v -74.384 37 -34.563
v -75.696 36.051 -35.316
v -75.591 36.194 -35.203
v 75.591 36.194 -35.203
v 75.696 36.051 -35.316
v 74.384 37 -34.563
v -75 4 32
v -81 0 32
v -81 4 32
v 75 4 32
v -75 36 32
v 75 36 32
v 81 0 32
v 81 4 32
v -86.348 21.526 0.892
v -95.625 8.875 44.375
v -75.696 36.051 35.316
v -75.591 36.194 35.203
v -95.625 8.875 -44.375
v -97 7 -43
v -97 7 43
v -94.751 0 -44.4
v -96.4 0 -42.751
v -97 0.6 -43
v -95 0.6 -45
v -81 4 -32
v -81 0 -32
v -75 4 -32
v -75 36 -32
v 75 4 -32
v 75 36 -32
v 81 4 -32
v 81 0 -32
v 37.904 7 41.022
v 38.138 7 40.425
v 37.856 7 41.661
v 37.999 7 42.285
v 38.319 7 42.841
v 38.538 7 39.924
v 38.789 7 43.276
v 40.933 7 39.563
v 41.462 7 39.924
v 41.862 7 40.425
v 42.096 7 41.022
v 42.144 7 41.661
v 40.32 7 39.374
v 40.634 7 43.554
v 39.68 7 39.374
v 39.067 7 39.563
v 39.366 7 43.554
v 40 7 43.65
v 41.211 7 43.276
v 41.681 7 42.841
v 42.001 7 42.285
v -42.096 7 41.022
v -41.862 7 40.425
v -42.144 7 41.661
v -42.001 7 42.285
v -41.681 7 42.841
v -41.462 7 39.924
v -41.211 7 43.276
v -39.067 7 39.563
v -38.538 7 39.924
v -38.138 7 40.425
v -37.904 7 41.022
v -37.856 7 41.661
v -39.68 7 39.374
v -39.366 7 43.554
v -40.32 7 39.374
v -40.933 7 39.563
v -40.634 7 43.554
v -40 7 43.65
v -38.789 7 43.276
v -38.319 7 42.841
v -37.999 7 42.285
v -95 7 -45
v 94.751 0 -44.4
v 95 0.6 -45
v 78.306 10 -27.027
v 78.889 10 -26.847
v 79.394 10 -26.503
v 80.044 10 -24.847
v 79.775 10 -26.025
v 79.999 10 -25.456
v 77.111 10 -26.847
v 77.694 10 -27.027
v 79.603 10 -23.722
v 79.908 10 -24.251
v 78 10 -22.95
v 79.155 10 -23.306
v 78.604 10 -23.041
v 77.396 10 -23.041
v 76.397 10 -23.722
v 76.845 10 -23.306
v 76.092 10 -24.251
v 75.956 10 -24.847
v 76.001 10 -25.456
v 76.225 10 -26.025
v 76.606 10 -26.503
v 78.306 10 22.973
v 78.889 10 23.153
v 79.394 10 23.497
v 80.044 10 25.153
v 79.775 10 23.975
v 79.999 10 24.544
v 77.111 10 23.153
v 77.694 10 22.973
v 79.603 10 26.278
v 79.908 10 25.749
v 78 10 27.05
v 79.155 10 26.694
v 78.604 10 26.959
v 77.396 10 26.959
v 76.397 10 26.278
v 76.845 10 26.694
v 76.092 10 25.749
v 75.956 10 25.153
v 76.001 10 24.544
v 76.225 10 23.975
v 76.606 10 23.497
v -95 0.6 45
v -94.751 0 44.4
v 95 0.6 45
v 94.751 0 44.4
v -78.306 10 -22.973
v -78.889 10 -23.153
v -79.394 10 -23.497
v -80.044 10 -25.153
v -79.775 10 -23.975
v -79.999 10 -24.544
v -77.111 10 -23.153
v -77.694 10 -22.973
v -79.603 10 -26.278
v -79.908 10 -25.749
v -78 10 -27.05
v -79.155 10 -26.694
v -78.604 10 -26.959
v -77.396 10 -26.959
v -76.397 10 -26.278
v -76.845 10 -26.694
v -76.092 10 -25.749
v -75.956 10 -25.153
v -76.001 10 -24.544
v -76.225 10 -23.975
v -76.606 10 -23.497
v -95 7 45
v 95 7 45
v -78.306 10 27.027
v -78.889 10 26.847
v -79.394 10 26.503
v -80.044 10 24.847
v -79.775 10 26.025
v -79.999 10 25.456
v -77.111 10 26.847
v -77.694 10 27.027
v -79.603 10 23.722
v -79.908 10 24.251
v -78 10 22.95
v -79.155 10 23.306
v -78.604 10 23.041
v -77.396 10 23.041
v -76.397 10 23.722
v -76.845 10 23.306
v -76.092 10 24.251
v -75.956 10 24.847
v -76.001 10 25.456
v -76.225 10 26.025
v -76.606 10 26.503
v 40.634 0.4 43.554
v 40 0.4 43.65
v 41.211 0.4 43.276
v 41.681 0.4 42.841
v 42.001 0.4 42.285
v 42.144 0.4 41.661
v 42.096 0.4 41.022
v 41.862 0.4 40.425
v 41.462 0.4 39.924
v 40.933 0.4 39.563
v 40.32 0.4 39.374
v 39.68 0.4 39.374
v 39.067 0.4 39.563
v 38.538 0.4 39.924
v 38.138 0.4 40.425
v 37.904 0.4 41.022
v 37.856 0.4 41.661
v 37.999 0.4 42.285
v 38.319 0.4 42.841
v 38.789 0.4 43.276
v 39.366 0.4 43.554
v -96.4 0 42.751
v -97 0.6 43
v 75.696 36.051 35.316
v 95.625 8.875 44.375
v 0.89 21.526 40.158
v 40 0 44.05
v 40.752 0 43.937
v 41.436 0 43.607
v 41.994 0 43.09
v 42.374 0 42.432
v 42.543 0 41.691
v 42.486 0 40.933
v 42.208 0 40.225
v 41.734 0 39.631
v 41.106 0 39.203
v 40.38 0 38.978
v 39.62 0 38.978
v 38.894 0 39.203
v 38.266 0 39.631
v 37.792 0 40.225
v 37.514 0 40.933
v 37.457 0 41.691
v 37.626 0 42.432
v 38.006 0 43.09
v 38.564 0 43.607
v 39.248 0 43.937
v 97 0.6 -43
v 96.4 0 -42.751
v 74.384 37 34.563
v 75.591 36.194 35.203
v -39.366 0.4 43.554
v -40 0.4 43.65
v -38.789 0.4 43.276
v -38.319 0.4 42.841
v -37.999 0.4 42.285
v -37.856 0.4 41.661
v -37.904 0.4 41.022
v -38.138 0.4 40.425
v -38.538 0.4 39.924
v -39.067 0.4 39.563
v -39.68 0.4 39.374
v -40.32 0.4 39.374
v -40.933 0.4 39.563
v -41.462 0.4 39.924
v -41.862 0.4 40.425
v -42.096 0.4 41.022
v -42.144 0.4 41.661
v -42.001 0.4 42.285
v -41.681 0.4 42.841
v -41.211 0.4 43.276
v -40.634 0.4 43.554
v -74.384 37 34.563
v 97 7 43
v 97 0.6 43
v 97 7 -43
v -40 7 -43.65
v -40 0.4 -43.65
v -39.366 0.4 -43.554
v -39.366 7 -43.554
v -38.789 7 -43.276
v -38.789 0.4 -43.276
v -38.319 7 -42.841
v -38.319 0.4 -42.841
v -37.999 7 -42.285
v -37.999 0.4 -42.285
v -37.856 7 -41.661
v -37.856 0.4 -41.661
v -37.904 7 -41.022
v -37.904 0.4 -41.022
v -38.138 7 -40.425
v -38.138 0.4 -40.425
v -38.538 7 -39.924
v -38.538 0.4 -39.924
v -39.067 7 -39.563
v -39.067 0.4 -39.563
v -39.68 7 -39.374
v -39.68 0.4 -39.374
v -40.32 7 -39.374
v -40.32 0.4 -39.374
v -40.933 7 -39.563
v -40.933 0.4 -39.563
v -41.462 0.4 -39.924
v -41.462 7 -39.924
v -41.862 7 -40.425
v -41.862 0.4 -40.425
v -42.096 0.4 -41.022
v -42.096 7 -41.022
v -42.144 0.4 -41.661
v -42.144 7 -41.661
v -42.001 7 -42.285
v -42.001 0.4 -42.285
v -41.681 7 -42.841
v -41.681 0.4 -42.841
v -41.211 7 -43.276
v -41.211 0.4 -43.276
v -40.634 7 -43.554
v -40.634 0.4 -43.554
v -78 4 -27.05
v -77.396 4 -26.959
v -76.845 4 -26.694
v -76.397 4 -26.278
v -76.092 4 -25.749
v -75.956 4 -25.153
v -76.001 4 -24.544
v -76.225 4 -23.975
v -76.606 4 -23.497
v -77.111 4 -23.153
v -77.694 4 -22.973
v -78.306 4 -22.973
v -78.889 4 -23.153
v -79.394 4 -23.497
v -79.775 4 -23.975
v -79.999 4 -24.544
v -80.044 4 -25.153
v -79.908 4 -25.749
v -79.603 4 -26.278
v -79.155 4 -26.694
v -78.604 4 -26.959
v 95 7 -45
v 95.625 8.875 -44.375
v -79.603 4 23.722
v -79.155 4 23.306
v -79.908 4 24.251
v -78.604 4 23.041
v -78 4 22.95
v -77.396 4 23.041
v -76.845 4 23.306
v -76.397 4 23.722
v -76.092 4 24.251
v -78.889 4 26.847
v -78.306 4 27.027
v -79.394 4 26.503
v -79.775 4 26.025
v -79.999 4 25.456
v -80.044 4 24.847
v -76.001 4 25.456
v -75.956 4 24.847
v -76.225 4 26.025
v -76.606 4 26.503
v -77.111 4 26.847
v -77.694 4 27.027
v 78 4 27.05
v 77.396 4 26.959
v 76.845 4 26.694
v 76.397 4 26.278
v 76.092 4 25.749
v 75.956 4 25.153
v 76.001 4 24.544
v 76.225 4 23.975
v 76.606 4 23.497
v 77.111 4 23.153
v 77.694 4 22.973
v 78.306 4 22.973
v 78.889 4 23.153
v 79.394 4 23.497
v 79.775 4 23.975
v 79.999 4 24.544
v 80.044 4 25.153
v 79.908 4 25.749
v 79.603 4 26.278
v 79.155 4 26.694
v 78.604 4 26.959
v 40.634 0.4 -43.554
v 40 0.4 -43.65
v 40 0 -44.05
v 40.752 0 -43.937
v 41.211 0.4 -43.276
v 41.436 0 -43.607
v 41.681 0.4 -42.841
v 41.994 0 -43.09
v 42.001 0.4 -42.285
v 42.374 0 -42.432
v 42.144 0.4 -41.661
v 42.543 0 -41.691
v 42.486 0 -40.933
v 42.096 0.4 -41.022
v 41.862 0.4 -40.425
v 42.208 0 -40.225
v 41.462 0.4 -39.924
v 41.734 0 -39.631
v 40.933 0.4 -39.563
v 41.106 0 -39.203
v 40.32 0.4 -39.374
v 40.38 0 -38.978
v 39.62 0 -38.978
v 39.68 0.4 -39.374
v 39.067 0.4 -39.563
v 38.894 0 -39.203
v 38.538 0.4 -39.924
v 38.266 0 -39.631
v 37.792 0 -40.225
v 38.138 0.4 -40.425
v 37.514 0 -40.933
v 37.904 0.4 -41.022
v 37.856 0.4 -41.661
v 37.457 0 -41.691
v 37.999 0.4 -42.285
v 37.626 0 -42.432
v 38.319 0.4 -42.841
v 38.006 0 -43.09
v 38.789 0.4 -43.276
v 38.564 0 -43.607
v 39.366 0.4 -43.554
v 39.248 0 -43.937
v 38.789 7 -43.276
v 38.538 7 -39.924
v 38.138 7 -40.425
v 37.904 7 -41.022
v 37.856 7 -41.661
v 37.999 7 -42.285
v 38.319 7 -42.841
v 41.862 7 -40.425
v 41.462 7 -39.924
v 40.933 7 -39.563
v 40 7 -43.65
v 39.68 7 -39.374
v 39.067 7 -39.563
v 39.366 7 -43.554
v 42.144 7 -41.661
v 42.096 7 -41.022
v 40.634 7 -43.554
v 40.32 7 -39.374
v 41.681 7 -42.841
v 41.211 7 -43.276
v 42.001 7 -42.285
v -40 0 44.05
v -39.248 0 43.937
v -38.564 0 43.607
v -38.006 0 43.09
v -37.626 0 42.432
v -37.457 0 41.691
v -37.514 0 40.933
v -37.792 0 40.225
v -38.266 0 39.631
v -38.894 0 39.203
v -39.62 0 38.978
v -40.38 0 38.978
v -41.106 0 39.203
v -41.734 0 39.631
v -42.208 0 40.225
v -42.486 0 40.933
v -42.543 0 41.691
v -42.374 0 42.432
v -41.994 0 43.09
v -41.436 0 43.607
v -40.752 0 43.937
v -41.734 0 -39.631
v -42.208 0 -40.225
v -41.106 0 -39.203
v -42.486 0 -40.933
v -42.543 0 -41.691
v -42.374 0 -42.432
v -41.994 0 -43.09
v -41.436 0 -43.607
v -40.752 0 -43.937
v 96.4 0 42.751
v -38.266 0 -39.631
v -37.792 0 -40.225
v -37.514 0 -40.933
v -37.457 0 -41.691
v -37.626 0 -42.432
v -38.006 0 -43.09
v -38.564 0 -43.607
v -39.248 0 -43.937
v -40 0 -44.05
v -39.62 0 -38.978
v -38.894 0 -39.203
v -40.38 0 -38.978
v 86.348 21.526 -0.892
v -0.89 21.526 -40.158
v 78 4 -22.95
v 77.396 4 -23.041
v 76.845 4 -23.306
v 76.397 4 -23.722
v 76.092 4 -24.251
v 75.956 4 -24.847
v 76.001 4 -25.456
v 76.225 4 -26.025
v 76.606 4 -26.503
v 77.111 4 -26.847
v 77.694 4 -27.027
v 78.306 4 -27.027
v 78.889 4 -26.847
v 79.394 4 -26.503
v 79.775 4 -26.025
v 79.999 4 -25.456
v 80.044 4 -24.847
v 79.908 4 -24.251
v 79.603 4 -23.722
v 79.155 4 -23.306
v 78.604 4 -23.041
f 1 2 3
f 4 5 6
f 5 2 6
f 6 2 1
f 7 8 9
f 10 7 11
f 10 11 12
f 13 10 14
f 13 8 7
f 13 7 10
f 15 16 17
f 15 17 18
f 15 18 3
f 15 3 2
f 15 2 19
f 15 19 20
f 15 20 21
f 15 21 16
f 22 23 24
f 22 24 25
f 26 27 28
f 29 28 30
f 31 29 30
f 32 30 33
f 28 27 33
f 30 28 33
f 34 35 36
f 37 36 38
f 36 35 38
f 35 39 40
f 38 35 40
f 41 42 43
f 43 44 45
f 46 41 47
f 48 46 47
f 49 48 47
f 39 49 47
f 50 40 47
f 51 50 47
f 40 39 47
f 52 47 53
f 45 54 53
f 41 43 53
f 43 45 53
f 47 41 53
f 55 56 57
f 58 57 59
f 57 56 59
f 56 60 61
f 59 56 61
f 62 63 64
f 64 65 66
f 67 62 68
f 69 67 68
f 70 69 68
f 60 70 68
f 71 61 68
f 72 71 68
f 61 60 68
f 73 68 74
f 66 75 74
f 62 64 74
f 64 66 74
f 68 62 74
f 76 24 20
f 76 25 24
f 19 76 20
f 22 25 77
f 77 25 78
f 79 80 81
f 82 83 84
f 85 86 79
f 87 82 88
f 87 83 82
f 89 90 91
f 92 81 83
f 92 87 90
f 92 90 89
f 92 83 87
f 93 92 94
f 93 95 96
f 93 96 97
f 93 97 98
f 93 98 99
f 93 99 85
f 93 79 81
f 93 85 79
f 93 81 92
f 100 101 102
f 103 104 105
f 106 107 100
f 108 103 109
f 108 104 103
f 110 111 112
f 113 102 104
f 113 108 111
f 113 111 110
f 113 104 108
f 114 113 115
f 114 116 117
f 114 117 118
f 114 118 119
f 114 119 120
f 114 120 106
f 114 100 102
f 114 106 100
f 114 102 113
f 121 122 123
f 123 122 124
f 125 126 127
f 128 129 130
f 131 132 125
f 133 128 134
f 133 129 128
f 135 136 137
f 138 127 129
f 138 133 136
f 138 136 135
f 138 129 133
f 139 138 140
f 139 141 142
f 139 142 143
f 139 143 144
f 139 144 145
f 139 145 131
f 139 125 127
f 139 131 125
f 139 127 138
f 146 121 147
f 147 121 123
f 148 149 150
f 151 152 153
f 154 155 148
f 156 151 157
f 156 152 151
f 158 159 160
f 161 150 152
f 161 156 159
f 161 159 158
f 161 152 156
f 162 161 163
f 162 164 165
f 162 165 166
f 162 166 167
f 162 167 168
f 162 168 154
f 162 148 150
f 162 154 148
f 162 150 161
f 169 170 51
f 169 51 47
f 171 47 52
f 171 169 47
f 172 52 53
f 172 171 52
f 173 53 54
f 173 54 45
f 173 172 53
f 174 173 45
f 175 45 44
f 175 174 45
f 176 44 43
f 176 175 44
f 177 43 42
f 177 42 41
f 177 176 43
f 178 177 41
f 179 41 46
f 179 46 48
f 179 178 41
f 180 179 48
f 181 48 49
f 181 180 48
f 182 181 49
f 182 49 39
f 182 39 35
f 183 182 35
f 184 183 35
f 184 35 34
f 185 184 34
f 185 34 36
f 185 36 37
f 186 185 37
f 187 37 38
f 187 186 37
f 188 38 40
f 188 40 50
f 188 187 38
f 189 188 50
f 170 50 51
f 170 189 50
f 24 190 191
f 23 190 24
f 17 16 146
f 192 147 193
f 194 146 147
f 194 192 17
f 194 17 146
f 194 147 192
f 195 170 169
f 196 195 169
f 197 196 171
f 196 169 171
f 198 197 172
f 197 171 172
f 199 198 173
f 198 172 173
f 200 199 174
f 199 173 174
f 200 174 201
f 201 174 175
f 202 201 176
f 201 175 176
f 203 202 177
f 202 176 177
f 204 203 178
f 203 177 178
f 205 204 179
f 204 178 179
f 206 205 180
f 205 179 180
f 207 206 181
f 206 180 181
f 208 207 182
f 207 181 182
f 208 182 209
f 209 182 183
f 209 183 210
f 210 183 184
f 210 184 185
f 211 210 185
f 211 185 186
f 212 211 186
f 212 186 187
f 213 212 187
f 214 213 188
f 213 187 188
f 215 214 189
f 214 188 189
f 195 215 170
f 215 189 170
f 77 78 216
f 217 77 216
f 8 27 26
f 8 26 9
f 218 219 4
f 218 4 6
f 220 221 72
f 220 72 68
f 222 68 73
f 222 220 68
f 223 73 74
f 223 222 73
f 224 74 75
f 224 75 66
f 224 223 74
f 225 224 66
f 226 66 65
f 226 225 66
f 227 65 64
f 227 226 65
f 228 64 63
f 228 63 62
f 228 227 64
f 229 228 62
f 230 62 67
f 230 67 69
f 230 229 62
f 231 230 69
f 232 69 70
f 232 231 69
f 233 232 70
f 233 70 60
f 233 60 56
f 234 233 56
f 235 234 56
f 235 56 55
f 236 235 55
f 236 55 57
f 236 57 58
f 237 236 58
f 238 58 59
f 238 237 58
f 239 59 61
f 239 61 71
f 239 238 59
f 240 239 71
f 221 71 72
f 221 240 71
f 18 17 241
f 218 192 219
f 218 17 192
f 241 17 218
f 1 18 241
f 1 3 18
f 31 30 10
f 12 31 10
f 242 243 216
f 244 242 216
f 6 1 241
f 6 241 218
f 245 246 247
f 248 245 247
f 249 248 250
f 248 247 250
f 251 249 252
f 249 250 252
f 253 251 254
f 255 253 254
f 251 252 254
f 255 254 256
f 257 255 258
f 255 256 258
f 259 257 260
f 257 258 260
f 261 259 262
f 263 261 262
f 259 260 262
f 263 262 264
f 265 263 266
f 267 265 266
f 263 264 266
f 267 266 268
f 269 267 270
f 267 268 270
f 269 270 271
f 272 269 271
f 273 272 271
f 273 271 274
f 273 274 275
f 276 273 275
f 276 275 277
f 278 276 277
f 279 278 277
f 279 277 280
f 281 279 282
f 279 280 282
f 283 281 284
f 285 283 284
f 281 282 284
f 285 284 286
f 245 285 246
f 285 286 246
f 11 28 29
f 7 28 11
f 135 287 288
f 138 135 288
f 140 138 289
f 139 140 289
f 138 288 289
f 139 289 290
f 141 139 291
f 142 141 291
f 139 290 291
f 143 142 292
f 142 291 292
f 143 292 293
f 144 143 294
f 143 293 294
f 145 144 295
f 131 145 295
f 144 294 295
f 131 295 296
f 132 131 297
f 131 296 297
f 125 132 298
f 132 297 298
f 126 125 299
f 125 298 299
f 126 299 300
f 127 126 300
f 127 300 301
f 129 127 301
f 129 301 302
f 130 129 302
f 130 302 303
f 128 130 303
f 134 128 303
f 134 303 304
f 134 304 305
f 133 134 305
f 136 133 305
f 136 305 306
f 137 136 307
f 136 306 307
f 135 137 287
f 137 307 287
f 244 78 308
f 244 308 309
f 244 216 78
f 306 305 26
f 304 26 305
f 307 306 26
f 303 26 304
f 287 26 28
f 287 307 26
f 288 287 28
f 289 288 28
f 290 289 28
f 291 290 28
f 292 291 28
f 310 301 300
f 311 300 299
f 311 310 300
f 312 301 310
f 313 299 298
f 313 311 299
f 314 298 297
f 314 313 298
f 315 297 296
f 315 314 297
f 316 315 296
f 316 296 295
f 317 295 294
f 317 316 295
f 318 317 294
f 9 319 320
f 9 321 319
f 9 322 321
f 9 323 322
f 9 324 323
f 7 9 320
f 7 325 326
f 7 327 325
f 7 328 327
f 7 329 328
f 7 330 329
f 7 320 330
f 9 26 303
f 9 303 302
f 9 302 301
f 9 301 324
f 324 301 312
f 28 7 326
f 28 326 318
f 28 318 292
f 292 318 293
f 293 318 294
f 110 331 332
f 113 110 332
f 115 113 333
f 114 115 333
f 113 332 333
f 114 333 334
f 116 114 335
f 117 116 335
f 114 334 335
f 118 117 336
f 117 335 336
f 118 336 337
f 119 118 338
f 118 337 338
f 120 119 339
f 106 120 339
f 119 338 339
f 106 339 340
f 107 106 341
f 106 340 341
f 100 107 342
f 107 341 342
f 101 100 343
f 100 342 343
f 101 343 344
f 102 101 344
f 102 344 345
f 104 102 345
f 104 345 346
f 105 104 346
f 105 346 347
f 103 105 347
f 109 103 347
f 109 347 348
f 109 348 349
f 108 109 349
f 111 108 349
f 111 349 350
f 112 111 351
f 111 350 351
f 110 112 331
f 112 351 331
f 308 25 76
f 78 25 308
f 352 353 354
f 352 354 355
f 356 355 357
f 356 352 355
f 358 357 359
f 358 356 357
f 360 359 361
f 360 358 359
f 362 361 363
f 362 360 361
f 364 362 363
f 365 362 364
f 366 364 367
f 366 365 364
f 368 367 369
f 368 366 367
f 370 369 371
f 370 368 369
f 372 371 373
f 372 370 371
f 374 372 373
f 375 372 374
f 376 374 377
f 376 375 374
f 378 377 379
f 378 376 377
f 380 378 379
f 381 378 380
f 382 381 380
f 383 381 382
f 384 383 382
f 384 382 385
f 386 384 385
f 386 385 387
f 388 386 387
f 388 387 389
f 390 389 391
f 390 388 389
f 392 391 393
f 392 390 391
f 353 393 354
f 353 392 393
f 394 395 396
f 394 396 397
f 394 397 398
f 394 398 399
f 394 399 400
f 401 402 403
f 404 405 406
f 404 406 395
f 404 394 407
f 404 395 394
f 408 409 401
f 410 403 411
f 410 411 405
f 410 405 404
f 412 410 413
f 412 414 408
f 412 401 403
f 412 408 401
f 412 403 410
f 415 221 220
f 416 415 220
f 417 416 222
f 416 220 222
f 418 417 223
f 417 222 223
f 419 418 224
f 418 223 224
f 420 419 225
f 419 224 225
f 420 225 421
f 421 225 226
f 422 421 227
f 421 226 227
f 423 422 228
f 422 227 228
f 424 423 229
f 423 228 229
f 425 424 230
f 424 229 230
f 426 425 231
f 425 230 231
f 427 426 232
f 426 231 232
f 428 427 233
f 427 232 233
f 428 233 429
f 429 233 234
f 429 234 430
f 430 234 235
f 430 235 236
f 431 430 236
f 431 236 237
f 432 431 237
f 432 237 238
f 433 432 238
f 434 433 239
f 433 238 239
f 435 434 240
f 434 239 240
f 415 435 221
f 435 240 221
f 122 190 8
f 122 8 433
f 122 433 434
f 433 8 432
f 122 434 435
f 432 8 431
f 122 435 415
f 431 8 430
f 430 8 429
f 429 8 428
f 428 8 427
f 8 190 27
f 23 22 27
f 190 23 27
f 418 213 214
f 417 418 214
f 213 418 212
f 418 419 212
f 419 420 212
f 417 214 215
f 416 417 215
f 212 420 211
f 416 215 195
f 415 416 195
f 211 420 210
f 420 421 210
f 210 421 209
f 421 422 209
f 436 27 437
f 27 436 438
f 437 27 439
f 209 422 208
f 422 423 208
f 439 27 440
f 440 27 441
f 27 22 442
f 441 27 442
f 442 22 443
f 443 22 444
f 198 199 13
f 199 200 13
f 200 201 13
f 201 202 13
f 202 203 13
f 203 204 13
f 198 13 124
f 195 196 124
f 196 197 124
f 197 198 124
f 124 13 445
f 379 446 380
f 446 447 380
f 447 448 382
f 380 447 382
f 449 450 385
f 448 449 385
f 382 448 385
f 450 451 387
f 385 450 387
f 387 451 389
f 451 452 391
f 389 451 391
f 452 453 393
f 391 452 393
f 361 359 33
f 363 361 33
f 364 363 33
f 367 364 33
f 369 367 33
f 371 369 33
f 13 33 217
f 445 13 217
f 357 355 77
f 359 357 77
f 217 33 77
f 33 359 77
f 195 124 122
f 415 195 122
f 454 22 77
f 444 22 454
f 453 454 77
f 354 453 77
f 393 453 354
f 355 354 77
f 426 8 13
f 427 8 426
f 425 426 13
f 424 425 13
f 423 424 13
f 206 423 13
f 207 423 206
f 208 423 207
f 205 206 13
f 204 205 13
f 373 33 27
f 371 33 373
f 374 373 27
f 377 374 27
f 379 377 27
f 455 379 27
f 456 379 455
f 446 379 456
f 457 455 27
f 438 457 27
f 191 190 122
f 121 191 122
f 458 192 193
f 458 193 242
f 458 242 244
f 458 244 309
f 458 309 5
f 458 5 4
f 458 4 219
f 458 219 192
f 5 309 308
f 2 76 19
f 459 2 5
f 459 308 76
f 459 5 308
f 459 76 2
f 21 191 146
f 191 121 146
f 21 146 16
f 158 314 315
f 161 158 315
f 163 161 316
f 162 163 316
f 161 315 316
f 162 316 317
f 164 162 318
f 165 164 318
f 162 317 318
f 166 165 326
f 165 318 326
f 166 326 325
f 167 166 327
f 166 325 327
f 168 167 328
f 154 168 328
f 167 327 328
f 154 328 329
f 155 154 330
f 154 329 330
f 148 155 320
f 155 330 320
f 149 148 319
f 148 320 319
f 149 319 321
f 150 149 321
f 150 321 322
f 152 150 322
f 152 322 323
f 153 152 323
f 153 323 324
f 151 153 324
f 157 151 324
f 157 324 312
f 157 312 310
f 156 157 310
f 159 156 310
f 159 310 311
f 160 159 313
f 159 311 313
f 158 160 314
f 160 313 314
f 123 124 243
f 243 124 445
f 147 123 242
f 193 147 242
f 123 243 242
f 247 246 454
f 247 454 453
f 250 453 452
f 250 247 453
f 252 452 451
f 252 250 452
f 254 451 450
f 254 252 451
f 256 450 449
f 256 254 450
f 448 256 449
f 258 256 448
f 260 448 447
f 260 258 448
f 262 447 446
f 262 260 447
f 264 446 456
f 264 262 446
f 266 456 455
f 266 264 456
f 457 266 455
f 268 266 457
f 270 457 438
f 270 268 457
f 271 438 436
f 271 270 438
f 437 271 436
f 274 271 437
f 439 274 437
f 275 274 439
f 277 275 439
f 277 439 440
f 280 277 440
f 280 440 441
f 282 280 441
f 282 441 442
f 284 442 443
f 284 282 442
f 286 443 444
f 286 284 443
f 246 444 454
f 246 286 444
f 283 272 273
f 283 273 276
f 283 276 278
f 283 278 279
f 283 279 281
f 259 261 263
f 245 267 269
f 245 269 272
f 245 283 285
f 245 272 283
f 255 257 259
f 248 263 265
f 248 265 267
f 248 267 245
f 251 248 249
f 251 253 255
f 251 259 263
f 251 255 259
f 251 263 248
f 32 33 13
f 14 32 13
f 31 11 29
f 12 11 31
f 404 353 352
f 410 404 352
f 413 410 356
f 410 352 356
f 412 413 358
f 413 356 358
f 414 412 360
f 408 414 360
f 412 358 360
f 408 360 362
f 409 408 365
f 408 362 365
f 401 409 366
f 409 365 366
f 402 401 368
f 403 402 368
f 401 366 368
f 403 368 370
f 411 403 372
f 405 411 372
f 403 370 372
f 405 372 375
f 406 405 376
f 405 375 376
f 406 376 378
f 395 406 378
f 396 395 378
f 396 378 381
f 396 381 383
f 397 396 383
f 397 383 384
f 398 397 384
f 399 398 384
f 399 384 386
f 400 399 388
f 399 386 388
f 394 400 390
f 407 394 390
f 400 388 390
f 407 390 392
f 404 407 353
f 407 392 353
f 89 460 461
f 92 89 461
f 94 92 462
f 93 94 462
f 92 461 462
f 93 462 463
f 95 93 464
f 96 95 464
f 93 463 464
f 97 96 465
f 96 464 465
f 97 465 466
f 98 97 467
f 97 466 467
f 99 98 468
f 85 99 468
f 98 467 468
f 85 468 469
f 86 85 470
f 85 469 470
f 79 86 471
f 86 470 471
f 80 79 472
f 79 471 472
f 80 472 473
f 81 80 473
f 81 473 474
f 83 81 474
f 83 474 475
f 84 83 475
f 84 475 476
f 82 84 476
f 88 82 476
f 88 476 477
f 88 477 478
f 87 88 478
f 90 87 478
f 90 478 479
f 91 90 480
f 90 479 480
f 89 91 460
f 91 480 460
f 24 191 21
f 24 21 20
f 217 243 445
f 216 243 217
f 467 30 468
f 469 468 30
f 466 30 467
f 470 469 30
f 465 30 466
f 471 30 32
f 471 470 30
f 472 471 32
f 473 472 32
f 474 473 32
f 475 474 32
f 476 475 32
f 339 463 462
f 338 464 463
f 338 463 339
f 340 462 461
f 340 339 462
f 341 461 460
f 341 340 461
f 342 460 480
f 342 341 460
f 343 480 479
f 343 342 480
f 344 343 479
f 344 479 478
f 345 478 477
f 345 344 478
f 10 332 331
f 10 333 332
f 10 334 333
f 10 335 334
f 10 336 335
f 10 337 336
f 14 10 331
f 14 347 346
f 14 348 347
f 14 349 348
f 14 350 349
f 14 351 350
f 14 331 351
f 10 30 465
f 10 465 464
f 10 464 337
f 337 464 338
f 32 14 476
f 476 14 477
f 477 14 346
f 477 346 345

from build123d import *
from OCP.BRepFilletAPI import BRepFilletAPI_MakeChamfer

# Parameters (mm, degrees)
SKETCH1_W                       = 194
SKETCH1_H                       = 90
BOSS_EXTRUDE1_DEPTH             = 7
SKETCH3_W                       = 194
SKETCH3_H                       = 90
SKETCH2_W                       = 150
SKETCH2_H                       = 70
CHAMFER1_SIZE                   = 2
SKETCH4_R                       = 2.15
CUT_EXTRUDE1_DEPTH              = 7
SKETCH5_W                       = 150
SKETCH5_H                       = 60
CUT_EXTRUDE2_DEPTH              = 36
SKETCH6_W                       = 150
SKETCH6_H                       = 64
CUT_EXTRUDE3_DEPTH              = 32
SKETCH7_W                       = 6
SKETCH7_H                       = 64
CUT_EXTRUDE4_DEPTH              = 4
SKETCH8_R                       = 2.05
CUT_EXTRUDE5_DEPTH              = 6
CHAMFER2_SIZE                   = 1
CHAMFER2_SIZE2                  = 0.615681714
CHAMFER2_SIZE2_2                = 0.436631997
CHAMFER3_SIZE                   = 0.6
SKIZZE1_W                       = 54.050484576
SKIZZE1_H                       = 12.5
SKIZZE1_W_2                     = 40
SKIZZE1_H_2                     = 21.453027382
AUFSATZ_LINEAR_AUSTRAGEN1_DEPTH = 10
SKIZZE3_W                       = 47.974757712
SKIZZE3_H                       = 1
SCHNITT_LINEAR_AUSTRAGEN2_DEPTH = 4
SKETCH9_W                       = 150
SKETCH9_H                       = 64
CUT_EXTRUDE6_DEPTH              = 32
CHAMFER4_SIZE                   = 0.4


with BuildPart() as part:
    # Sketch1 → Boss-Extrude1 (new body)
    with BuildSketch(Plane(origin=(0, 0, 0), x_dir=(1, 0, 0), z_dir=(0, 1, 0))):
        Rectangle(SKETCH1_W, SKETCH1_H)
    extrude(amount=BOSS_EXTRUDE1_DEPTH)

    # Sketch3 → Loft2 section 0
    with BuildSketch(Plane(origin=(0, 7, 0), x_dir=(1, 0, 0), z_dir=(0, 1, 0))):
        Rectangle(SKETCH3_W, SKETCH3_H)
    # Sketch2 → Loft2 section 1
    with BuildSketch(Plane(origin=(0, 37, 0), x_dir=(1, 0, 0), z_dir=(0, 1, 0))):
        Rectangle(SKETCH2_W, SKETCH2_H)
    loft()

    # Chamfer1
    chamfer1_edges = [part.edges().sort_by_distance(p)[0] for p in [
        (-97, 3.5, 45),
        (97, 3.5, 45),
        (97, 3.5, -45),
        (-97, 3.5, -45),
    ]]
    chamfer(chamfer1_edges, length=CHAMFER1_SIZE)

    # Sketch4 → Cut-Extrude1 (cut)
    with BuildSketch(Plane.XZ):
        with Locations(Location((40, -41.5, 0), (0, 0, 270))):
            Circle(SKETCH4_R)
        with Locations(Location((-40, -41.5, 0), (0, 0, 270))):
            Circle(SKETCH4_R)
    cut_extrude1 = extrude(amount=-CUT_EXTRUDE1_DEPTH, mode=Mode.SUBTRACT)

    # Sketch5 → Cut-Extrude2 (cut)
    with BuildSketch(Plane.XZ):
        Rectangle(SKETCH5_W, SKETCH5_H)
    extrude(amount=-CUT_EXTRUDE2_DEPTH, mode=Mode.SUBTRACT)

    # Mirror1: Cut-Extrude1 across plane
    add(cut_extrude1.mirror(Plane.XY), mode=Mode.SUBTRACT)

    # Sketch6 → Cut-Extrude3 (cut)
    with BuildSketch(Plane.XZ):
        Rectangle(SKETCH6_W, SKETCH6_H)
    extrude(amount=-CUT_EXTRUDE3_DEPTH, mode=Mode.SUBTRACT)

    # Sketch7 → Cut-Extrude4 (cut)
    with BuildSketch(Plane.XZ):
        with Locations((-78, 0)):
            Rectangle(SKETCH7_W, SKETCH7_H)
        with Locations((78, 0)):
            Rectangle(SKETCH7_W, SKETCH7_H)
    extrude(amount=-CUT_EXTRUDE4_DEPTH, mode=Mode.SUBTRACT)

    # Sketch8 → Cut-Extrude5 (cut)
    with BuildSketch(Plane.XZ.offset(-4)):
        with Locations(Location((-78, 25, 0), (0, 0, 270))):
            Circle(SKETCH8_R)
        with Locations(Location((-78, -25, 0), (0, 0, 270))):
            Circle(SKETCH8_R)
        with Locations(Location((78, -25, 0), (0, 0, 90))):
            Circle(SKETCH8_R)
        with Locations(Location((78, 25, 0), (0, 0, 90))):
            Circle(SKETCH8_R)
    extrude(amount=-CUT_EXTRUDE5_DEPTH, mode=Mode.SUBTRACT)

    # Chamfer2: one chamfer whose edges measure the first distance from different faces: ONE call of the kernel's chamfer builder (chamfer() names one face for all edges)
    chamfer2_edges_1 = [part.edges().sort_by_distance(p)[0] for p in [
        (75, 37, 0),
    ]]
    chamfer2_side_1 = [part.faces().sort_by_distance(p)[0] for p in [
        (86.442553469, 21.396517997, 0),
    ]]
    chamfer2_edges_2 = [part.edges().sort_by_distance(p)[0] for p in [
        (0, 37, -35),
    ]]
    chamfer2_side_2 = [part.faces().sort_by_distance(p)[0] for p in [
        (0, 21.370454545, -40.209848485),
    ]]
    chamfer2_edges_3 = [part.edges().sort_by_distance(p)[0] for p in [
        (-75, 37, 0),
    ]]
    chamfer2_side_3 = [part.faces().sort_by_distance(p)[0] for p in [
        (-86.442553469, 21.396517997, 0),
    ]]
    chamfer2_edges_4 = [part.edges().sort_by_distance(p)[0] for p in [
        (0, 37, 35),
    ]]
    chamfer2_side_4 = [part.faces().sort_by_distance(p)[0] for p in [
        (0, 21.370454545, 40.209848485),
    ]]
    chamfer2 = BRepFilletAPI_MakeChamfer(part.part.solid().wrapped)
    for e in chamfer2_edges_1:
        chamfer2.Add(CHAMFER2_SIZE, CHAMFER2_SIZE2, e.wrapped, chamfer2_side_1[0].wrapped)  # the first distance lies on this face
    for e in chamfer2_edges_2:
        chamfer2.Add(CHAMFER2_SIZE, CHAMFER2_SIZE2_2, e.wrapped, chamfer2_side_2[0].wrapped)  # the first distance lies on this face
    for e in chamfer2_edges_3:
        chamfer2.Add(CHAMFER2_SIZE, CHAMFER2_SIZE2, e.wrapped, chamfer2_side_3[0].wrapped)  # the first distance lies on this face
    for e in chamfer2_edges_4:
        chamfer2.Add(CHAMFER2_SIZE, CHAMFER2_SIZE2_2, e.wrapped, chamfer2_side_4[0].wrapped)  # the first distance lies on this face
    add(Compound.cast(chamfer2.Shape()), mode=Mode.REPLACE)

    # Chamfer3
    chamfer3_edges = [part.edges().sort_by_distance(p)[0] for p in [
        (0, 0, 45),
        (97, 0, 0),
        (-97, 0, 0),
        (0, 0, -45),
        (-96, 0, -44),
        (96, 0, -44),
        (96, 0, 44),
        (-96, 0, 44),
    ]]
    chamfer(chamfer3_edges, length=CHAMFER3_SIZE)

    # Skizze1 → Aufsatz-Linear austragen1 (add)
    with BuildSketch(Plane.XZ.offset(-36)):
        with Locations((0, -23.75)):
            Rectangle(SKIZZE1_W, SKIZZE1_H)
        with Locations((0, 23.75)):
            Rectangle(SKIZZE1_W, SKIZZE1_H)
        with Locations((55, 0)):
            Rectangle(SKIZZE1_W_2, SKIZZE1_H_2)
    extrude(amount=AUFSATZ_LINEAR_AUSTRAGEN1_DEPTH)

    # Skizze3 → Schnitt-Linear austragen2 (cut)
    with BuildSketch(Plane(origin=(0, 36, 0), x_dir=(-1, 0, 0), z_dir=(0, -1, 0))):
        with Locations((51.012621144, -30.5)):
            Rectangle(SKIZZE3_W, SKIZZE3_H)
        with Locations((-51.012621144, -30.5)):
            Rectangle(SKIZZE3_W, SKIZZE3_H)
        with Locations((51.012621144, 30.5)):
            Rectangle(SKIZZE3_W, SKIZZE3_H)
        with Locations((-51.012621144, 30.5)):
            Rectangle(SKIZZE3_W, SKIZZE3_H)
    extrude(amount=SCHNITT_LINEAR_AUSTRAGEN2_DEPTH, mode=Mode.SUBTRACT)

    # Sketch9 → Cut-Extrude6 (cut)
    with BuildSketch(Plane.XZ.offset(-4)):
        Rectangle(SKETCH9_W, SKETCH9_H)
    extrude(amount=-CUT_EXTRUDE6_DEPTH, mode=Mode.SUBTRACT)

    # Chamfer4
    chamfer4_edges = [part.edges().sort_by_distance(p)[0] for p in [
        (40, 0, -39.35),
        (-40, 0, -39.35),
        (40, 0, 39.35),
        (-40, 0, 39.35),
    ]]
    chamfer(chamfer4_edges, length=CHAMFER4_SIZE)


solid = part.part
